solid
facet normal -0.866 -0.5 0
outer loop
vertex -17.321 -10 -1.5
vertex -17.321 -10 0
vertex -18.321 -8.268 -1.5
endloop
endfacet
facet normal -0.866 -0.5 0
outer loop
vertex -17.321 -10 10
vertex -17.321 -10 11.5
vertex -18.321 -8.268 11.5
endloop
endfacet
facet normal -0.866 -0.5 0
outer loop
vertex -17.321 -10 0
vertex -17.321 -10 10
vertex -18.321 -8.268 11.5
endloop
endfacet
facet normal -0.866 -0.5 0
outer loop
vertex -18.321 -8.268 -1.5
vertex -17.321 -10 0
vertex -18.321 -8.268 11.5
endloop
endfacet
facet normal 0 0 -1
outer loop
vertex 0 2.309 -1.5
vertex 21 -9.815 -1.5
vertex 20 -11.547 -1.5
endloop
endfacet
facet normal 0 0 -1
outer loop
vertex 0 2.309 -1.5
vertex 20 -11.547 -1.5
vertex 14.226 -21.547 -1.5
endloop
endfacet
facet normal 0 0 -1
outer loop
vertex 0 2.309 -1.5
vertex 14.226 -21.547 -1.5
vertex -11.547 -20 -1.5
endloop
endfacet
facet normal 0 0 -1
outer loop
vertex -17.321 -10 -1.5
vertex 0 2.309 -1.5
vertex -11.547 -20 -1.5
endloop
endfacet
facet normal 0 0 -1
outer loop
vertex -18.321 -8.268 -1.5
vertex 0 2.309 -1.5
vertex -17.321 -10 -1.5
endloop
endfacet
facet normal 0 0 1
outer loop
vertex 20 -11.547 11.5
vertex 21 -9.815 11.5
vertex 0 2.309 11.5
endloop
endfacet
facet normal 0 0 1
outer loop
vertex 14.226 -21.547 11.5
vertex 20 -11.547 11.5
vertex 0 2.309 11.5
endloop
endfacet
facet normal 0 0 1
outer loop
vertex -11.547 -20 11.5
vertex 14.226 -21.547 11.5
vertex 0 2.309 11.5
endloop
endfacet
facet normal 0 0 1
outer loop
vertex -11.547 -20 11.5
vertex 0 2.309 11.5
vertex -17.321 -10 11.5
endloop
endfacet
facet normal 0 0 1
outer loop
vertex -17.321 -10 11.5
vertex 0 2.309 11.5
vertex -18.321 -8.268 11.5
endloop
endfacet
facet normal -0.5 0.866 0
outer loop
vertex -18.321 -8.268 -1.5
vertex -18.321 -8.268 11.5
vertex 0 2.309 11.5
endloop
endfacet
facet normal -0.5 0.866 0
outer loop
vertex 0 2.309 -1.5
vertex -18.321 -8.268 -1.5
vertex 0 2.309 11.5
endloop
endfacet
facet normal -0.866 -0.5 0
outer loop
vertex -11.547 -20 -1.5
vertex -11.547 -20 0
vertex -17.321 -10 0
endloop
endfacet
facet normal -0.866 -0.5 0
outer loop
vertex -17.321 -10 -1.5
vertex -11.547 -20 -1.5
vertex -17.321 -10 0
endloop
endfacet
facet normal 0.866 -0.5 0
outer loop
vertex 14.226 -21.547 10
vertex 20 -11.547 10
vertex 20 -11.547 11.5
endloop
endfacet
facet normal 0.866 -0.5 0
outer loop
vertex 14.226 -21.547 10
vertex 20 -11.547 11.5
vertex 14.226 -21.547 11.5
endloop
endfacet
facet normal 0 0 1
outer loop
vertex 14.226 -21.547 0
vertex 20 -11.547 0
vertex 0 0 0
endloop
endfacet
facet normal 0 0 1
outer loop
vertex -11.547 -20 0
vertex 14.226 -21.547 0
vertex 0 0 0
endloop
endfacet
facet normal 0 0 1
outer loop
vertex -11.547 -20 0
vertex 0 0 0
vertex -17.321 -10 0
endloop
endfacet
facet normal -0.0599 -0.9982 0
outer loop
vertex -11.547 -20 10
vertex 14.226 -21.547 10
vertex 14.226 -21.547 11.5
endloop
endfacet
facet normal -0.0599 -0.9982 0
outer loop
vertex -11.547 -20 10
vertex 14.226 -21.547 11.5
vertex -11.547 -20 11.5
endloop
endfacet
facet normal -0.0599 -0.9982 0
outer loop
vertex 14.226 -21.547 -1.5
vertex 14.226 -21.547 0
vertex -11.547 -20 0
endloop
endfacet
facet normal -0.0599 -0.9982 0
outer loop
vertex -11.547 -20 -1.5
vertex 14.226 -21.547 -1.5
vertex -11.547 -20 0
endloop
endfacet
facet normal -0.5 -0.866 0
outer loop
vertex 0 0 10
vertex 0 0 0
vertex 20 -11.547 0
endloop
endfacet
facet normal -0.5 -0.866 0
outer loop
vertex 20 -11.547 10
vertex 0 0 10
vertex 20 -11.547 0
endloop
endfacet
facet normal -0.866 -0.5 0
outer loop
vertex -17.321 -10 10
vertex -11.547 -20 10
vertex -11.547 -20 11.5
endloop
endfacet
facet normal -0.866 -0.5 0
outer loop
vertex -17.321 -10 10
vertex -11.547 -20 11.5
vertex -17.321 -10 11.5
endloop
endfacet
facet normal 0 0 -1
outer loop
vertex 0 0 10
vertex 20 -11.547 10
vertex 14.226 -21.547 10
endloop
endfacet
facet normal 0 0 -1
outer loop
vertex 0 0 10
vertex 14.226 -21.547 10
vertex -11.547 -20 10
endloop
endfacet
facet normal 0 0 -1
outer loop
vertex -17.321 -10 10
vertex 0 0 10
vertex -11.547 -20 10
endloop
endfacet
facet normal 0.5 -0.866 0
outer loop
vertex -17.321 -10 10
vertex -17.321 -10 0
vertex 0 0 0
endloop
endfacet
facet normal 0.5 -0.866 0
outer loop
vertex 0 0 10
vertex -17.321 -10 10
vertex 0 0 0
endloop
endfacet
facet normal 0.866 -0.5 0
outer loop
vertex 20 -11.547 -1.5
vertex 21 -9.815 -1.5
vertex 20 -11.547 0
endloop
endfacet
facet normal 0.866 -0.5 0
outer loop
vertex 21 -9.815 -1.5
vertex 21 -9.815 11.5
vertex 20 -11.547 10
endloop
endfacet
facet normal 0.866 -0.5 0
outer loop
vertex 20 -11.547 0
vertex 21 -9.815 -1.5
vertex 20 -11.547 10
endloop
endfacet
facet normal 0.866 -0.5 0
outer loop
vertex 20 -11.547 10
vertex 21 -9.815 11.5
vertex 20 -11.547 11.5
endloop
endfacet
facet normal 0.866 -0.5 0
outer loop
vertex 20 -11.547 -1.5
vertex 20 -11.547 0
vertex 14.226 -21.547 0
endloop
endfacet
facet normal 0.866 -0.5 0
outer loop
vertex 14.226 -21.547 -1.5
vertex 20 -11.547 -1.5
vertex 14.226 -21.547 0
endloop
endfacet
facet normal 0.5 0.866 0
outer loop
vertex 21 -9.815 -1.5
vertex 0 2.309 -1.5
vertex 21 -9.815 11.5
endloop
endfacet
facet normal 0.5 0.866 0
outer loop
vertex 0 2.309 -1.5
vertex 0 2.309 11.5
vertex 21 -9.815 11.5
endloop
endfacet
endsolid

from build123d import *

# Parameters (mm, degrees)
BOSS_EXTRUDE1_DEPTH = 10
BOSS_EXTRUDE2_DEPTH = 1.5


with BuildPart() as part:
    # Sketch1 → Boss-Extrude1 (new body)
    with BuildSketch(Plane.XY):
        Polygon((0, 0), (20, -11.547005384), (21, -9.814954576), (0, 2.309401077), (-18.320508076, -8.267949192), (-17.320508076, -10), align=None)
    extrude(amount=BOSS_EXTRUDE1_DEPTH)

    # Sketch2 → Boss-Extrude2 (add)
    with BuildSketch(Plane.XY.offset(10)):
        Polygon((-18.320508076, -8.267949192), (0, 2.309401077), (21, -9.814954576), (20, -11.547005384), (14.226497308, -21.547005384), (-11.547005384, -20), (-17.320508076, -10), align=None)
    boss_extrude2 = extrude(amount=BOSS_EXTRUDE2_DEPTH)

    # Mirror1: Boss-Extrude2 across plane
    add(boss_extrude2.mirror(Plane(origin=(0, 0, 5), x_dir=(1, 0, 0), z_dir=(0, 0, -1))))


solid = part.part
